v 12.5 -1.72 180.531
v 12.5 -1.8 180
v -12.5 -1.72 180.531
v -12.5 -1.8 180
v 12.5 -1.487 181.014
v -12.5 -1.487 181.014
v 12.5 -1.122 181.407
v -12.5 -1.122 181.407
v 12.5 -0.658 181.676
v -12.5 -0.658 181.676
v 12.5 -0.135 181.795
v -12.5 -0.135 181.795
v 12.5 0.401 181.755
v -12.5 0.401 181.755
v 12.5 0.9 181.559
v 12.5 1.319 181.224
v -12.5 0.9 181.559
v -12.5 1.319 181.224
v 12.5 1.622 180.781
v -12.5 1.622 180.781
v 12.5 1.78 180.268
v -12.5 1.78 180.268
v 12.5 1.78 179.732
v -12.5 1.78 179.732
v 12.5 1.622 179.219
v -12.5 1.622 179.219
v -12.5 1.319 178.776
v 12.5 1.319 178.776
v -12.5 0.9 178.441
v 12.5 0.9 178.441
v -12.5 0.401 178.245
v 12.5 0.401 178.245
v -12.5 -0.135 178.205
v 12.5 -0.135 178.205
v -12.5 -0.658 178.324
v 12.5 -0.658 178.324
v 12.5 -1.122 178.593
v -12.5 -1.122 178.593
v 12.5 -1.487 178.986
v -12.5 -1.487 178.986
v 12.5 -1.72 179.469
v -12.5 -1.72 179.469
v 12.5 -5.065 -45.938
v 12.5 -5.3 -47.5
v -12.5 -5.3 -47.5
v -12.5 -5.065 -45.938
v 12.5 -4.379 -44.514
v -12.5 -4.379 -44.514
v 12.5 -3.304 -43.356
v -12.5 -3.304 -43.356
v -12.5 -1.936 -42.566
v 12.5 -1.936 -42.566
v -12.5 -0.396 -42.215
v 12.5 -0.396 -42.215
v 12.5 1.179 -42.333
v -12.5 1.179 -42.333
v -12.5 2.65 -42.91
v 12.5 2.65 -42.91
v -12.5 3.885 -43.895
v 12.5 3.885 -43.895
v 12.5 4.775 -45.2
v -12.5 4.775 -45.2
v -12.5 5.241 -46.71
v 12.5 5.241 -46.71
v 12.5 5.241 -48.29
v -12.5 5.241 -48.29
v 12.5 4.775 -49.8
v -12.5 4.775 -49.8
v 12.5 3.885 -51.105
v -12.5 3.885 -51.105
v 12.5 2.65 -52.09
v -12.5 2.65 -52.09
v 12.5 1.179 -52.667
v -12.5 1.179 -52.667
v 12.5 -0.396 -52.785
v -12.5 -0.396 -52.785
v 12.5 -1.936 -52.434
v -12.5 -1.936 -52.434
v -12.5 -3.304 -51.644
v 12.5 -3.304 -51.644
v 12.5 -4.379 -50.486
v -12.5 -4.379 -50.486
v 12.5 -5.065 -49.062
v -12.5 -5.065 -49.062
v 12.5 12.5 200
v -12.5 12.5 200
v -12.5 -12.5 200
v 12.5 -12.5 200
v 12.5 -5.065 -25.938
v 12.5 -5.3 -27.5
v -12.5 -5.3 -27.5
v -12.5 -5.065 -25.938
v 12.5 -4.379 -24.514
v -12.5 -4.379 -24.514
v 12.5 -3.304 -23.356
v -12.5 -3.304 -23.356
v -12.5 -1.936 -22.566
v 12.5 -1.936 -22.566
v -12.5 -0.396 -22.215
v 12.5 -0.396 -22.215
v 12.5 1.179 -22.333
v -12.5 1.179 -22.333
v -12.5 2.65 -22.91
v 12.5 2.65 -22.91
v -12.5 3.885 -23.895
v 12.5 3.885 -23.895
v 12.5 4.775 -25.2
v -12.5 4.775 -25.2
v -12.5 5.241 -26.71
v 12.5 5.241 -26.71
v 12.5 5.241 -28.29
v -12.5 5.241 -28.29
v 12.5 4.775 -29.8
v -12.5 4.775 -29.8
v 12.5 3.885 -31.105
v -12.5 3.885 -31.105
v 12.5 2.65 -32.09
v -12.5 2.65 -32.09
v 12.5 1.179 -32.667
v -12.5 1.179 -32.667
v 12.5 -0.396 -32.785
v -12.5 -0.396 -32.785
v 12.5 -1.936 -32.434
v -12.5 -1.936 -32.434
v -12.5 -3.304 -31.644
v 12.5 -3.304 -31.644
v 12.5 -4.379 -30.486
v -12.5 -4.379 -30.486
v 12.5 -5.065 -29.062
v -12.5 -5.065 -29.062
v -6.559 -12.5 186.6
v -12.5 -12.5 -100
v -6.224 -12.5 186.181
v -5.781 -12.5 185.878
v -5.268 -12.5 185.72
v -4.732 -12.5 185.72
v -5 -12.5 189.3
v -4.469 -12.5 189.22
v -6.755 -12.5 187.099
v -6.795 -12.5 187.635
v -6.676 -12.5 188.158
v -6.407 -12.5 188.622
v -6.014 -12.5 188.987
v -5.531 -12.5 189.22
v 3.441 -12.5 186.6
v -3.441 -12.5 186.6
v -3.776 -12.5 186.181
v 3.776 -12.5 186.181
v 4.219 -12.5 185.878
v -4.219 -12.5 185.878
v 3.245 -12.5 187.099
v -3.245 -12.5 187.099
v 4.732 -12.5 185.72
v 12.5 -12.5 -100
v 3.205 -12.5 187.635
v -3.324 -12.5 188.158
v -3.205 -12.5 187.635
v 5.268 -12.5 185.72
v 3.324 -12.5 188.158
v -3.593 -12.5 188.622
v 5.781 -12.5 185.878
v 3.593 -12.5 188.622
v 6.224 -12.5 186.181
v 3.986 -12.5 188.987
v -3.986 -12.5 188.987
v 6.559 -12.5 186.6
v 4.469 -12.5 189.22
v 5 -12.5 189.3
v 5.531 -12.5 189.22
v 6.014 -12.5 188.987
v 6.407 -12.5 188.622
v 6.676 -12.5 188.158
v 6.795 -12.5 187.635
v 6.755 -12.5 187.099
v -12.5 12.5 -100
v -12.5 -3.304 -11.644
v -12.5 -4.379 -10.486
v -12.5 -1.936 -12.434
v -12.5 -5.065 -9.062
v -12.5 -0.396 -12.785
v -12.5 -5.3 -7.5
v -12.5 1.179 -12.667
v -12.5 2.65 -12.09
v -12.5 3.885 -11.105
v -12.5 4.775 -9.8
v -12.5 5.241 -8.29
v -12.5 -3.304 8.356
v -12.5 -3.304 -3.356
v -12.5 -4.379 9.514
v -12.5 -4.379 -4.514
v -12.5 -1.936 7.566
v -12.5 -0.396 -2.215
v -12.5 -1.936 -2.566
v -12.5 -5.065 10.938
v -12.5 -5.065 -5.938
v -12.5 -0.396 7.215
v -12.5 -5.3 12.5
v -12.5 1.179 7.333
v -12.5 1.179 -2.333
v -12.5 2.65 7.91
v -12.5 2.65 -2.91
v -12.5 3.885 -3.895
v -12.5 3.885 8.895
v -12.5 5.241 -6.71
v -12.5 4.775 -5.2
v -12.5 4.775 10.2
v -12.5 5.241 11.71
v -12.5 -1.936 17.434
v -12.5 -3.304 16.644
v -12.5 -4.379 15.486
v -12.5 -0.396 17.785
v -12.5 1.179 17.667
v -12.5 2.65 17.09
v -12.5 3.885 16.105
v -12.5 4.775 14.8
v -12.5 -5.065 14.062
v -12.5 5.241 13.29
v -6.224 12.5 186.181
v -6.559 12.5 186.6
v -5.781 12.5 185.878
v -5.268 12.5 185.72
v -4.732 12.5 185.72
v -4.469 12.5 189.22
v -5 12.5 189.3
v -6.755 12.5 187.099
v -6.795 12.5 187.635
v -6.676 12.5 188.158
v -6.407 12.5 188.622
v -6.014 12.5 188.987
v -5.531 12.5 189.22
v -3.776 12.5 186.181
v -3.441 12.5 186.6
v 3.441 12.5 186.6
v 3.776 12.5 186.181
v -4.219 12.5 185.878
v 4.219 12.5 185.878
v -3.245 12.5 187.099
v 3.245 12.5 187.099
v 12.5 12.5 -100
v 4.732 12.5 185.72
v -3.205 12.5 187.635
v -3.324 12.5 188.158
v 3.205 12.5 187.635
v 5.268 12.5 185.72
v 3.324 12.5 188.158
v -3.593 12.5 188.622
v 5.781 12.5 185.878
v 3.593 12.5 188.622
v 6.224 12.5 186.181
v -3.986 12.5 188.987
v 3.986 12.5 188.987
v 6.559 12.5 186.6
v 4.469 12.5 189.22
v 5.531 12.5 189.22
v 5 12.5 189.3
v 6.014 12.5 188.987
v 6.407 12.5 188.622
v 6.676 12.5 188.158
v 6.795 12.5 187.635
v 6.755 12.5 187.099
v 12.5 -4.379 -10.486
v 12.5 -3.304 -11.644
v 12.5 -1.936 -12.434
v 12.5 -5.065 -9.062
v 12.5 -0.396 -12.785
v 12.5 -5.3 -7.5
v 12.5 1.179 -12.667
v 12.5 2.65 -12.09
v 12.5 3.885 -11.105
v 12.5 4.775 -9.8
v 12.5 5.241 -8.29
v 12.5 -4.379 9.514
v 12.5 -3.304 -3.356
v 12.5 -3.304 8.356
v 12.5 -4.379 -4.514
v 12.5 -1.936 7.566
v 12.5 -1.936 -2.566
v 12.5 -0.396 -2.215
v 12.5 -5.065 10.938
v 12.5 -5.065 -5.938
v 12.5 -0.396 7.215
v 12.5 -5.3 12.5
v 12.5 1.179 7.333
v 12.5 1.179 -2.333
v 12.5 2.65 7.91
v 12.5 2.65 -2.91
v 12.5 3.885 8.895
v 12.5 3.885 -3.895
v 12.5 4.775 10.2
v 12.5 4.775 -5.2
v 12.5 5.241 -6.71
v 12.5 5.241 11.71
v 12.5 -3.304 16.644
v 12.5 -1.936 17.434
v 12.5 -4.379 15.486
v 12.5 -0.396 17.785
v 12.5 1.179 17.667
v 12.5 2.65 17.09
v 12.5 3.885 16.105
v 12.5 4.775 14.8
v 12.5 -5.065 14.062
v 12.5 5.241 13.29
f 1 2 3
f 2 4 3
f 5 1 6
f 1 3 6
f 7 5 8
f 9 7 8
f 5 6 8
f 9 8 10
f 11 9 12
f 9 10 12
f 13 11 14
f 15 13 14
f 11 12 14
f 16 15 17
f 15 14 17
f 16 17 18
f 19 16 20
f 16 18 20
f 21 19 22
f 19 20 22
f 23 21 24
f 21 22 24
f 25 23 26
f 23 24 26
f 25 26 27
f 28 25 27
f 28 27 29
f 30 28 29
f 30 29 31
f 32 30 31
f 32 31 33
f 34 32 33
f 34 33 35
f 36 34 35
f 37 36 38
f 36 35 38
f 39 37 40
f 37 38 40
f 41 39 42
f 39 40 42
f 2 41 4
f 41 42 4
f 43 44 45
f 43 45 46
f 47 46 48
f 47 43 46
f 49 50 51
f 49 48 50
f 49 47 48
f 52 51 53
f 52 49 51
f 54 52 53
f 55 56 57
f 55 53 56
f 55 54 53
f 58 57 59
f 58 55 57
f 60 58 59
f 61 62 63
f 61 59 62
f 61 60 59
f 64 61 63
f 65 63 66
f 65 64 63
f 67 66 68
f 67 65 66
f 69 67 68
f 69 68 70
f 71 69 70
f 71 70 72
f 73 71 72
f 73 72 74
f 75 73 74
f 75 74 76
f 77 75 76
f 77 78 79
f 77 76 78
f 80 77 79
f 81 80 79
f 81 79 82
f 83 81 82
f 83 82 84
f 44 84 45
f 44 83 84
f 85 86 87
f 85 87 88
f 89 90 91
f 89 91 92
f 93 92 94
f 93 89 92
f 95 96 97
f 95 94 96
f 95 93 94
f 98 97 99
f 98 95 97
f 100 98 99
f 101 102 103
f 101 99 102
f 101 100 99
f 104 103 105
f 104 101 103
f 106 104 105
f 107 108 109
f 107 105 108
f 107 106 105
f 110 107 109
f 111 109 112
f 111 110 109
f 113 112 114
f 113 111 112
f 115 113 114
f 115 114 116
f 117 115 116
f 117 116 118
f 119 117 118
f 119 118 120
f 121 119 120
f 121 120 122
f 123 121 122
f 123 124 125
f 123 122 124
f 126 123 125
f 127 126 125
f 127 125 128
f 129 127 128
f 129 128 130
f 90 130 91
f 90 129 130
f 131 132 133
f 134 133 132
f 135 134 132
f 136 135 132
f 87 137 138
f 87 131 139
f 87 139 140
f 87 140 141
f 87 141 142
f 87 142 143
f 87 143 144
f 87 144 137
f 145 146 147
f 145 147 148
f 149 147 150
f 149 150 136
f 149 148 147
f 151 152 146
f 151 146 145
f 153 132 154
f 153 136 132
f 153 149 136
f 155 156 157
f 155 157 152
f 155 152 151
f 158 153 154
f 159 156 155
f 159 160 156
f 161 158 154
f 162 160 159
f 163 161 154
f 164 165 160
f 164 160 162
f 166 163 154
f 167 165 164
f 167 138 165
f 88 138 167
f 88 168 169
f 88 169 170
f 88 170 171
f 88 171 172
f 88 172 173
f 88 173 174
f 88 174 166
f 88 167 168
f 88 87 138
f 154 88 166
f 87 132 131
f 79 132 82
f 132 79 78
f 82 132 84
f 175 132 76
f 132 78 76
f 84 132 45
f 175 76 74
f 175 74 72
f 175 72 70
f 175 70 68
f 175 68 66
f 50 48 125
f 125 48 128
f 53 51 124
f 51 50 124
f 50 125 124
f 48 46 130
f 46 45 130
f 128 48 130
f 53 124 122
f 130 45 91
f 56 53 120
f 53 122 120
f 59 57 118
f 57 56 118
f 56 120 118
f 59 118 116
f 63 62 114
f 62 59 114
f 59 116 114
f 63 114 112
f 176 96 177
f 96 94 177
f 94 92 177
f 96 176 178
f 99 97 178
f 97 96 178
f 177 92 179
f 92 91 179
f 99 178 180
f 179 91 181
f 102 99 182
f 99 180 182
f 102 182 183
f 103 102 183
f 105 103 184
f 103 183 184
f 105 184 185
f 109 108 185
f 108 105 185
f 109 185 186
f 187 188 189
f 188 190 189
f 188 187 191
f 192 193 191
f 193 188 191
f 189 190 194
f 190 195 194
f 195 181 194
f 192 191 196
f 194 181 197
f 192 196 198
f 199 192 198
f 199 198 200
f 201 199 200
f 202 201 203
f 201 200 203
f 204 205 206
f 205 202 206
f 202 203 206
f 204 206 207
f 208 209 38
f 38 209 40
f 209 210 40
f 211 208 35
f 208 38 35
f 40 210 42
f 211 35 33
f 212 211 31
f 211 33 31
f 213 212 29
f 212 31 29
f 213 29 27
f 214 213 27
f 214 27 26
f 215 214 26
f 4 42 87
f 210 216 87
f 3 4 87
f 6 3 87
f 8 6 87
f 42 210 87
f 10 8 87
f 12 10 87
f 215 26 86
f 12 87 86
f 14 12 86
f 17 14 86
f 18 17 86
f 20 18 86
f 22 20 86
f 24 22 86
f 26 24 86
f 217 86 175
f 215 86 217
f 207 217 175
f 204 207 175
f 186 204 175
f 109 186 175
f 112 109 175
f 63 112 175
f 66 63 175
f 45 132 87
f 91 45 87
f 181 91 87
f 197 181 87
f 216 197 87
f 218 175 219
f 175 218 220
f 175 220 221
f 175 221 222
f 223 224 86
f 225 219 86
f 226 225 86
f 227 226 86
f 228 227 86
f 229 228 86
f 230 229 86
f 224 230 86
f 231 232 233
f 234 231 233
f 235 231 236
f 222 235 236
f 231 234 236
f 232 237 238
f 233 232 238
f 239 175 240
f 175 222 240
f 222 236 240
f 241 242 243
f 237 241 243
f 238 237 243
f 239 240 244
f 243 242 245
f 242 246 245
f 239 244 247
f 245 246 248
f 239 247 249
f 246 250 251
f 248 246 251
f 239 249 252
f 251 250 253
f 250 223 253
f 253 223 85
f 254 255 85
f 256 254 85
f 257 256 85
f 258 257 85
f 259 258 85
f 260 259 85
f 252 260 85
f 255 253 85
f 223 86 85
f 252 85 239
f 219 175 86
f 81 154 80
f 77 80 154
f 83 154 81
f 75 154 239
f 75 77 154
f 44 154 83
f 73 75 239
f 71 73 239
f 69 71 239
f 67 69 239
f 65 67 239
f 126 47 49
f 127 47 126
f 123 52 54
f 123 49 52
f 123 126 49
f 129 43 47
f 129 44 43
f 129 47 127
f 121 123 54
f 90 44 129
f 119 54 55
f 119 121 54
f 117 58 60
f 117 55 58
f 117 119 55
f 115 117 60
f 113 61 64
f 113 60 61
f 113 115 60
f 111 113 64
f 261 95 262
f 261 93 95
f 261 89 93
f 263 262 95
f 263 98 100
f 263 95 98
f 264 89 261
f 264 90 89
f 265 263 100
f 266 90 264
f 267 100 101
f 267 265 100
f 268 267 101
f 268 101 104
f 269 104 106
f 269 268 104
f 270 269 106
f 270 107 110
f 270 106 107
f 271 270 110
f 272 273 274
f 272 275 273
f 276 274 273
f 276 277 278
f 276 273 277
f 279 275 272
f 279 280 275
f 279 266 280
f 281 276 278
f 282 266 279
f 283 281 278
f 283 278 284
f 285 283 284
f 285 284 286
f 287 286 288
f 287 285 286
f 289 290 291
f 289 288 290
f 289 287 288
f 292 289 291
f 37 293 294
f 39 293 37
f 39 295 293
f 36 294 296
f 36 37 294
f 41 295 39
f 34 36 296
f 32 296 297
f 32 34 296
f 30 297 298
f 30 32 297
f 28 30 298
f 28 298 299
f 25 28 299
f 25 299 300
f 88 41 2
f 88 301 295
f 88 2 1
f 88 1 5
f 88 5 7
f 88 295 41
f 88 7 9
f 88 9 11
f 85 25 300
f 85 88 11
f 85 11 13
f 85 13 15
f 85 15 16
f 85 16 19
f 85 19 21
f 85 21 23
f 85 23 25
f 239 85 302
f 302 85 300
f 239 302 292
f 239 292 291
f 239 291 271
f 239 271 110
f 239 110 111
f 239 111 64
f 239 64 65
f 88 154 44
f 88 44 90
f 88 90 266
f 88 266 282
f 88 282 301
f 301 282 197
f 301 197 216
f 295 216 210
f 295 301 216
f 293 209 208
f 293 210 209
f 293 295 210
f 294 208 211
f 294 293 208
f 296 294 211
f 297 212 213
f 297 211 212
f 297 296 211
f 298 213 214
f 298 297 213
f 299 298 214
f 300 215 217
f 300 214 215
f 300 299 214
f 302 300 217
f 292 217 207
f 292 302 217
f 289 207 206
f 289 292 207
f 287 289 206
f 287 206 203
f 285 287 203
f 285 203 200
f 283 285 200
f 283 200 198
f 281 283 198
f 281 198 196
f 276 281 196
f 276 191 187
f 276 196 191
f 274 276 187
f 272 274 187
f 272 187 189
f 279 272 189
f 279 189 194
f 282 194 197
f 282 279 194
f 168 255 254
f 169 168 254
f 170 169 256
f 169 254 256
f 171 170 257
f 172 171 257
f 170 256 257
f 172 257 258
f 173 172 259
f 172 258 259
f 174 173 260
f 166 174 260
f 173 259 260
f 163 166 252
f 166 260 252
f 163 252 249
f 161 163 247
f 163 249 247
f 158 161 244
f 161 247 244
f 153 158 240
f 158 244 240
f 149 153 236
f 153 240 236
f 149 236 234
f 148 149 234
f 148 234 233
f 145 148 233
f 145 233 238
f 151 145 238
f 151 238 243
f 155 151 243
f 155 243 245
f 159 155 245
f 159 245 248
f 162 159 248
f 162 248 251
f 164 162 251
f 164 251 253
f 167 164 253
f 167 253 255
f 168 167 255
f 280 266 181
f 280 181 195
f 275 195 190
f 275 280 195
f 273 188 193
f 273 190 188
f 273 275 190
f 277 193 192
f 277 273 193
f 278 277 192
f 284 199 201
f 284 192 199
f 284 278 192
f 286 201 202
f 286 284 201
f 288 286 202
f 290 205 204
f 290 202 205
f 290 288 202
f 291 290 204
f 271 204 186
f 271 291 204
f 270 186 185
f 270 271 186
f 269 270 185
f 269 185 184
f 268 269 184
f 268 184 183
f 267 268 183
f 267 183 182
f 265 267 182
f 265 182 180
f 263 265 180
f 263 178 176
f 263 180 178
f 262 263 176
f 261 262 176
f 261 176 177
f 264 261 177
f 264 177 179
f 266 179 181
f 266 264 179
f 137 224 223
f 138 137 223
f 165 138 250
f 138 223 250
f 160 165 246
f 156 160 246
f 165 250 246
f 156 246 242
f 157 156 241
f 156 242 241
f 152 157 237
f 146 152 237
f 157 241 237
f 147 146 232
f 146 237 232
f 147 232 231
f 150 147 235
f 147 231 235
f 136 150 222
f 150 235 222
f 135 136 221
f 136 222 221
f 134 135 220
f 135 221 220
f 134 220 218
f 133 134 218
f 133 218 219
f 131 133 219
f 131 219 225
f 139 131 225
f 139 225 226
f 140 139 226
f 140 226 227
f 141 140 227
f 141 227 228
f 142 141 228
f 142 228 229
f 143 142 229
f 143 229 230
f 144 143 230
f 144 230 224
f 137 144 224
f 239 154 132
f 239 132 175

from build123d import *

# Parameters (mm, degrees)
SKETCH1_W               = 25
SKETCH1_H               = 25
BOSS_EXTRUDE1_DEPTH     = 200
SKETCH2_R               = 2.5
CUT_EXTRUDE1_DEPTH      = 202.943680268
SKETCH3_R               = 1.8
CUT_EXTRUDE2_DEPTH      = 202.943680268
SKETCH4_R               = 1.8
CUT_EXTRUDE3_DEPTH      = 202.943680268
CUT_EXTRUDE5_DEPTH      = 202.943680268
CUT_EXTRUDE5_DEPTH_BACK = 202.943680268
SKETCH6_R               = 2.5
CUT_EXTRUDE6_DEPTH      = 202.943680268
CUT_EXTRUDE6_DEPTH_BACK = 202.943680268
SKETCH7_R               = 5.3
CUT_EXTRUDE7_DEPTH      = 202.943680268
CUT_EXTRUDE7_DEPTH_BACK = 202.943680268
SKETCH8_W               = 75
SKETCH8_H               = 25


with BuildPart() as part:
    # Sketch1 → Boss-Extrude1 (new body)
    with BuildSketch(Plane.XY):
        Rectangle(SKETCH1_W, SKETCH1_H)
    boss_extrude1 = extrude(amount=BOSS_EXTRUDE1_DEPTH)

    # Sketch2 → Cut-Extrude1 (cut, through all)
    with BuildSketch(Plane(origin=(12.5, 0, 0), x_dir=(0, 0, -1), z_dir=(1, 0, 0))):
        with Locations(Location((-12.5, 0, 0), (0, 0, 90))):
            Circle(SKETCH2_R)
    cut_extrude1 = extrude(amount=-CUT_EXTRUDE1_DEPTH, mode=Mode.SUBTRACT)

    # Sketch3 → Cut-Extrude2 (cut, through all)
    with BuildSketch(Plane(origin=(0, 12.5, 0), x_dir=(1, 0, 0), z_dir=(0, 1, 0))):
        with Locations(Location((-5, -187.5, 0), (0, 0, 270))):
            Circle(SKETCH3_R)
        with Locations(Location((5, -187.5, 0), (0, 0, 270))):
            Circle(SKETCH3_R)
    cut_extrude2 = extrude(amount=-CUT_EXTRUDE2_DEPTH, mode=Mode.SUBTRACT)

    # Sketch4 → Cut-Extrude3 (cut, symmetric)
    with BuildSketch(Plane.ZY.offset(12.5)):
        with Locations(Location((180, 0, 0), (0, 0, 270))):
            Circle(SKETCH4_R)
    cut_extrude3 = extrude(amount=CUT_EXTRUDE3_DEPTH, both=True, mode=Mode.SUBTRACT)

    # Mirror2: Boss-Extrude1, Cut-Extrude1, Cut-Extrude2, Cut-Extrude3 across plane
    add(boss_extrude1.mirror(Plane(origin=(0, 0, 12.5), x_dir=(1, 0, 0), z_dir=(0, 0, -1))))
    add(cut_extrude1.mirror(Plane(origin=(0, 0, 12.5), x_dir=(1, 0, 0), z_dir=(0, 0, -1))), mode=Mode.SUBTRACT)
    add(cut_extrude2.mirror(Plane(origin=(0, 0, 12.5), x_dir=(1, 0, 0), z_dir=(0, 0, -1))), mode=Mode.SUBTRACT)
    add(cut_extrude3.mirror(Plane(origin=(0, 0, 12.5), x_dir=(1, 0, 0), z_dir=(0, 0, -1))), mode=Mode.SUBTRACT)

    # Sketch6 → Cut-Extrude5 (cut, two sides: drawn at the far end of the back side and taken through both)
    with BuildSketch(Plane(origin=(12.5, 0, 0), x_dir=(0, 0, -1), z_dir=(1, 0, 0)).offset(-CUT_EXTRUDE5_DEPTH_BACK)):
        with Locations(Location((7.5, 0, 0), (0, 0, 90))):
            Circle(SKETCH6_R)
        with Locations(Location((-12.5, 0, 0), (0, 0, 90))):
            Circle(SKETCH6_R)
        with Locations(Location((27.5, 0, 0), (0, 0, 90))):
            Circle(SKETCH6_R)
        with Locations(Location((47.5, 0, 0), (0, 0, 90))):
            Circle(SKETCH6_R)
    extrude(amount=CUT_EXTRUDE5_DEPTH + CUT_EXTRUDE5_DEPTH_BACK, mode=Mode.SUBTRACT)

    # Sketch7 → Cut-Extrude6 (cut, two sides: drawn at the far end of the back side and taken through both)
    with BuildSketch(Plane.ZY.offset(12.5).offset(-CUT_EXTRUDE6_DEPTH_BACK)):
        with Locations(Location((-47.5, 0, 0), (0, 0, 270))):
            Circle(SKETCH7_R)
        with Locations(Location((-27.5, 0, 0), (0, 0, 270))):
            Circle(SKETCH7_R)
        with Locations(Location((-7.5, 0, 0), (0, 0, 270))):
            Circle(SKETCH7_R)
        with Locations(Location((12.5, 0, 0), (0, 0, 270))):
            Circle(SKETCH7_R)
    extrude(amount=CUT_EXTRUDE6_DEPTH + CUT_EXTRUDE6_DEPTH_BACK, mode=Mode.SUBTRACT)

    # Sketch8 → Cut-Extrude7 (cut, two sides: drawn at the far end of the back side and taken through both)
    with BuildSketch(Plane.ZY.offset(12.5).offset(-CUT_EXTRUDE7_DEPTH_BACK)):
        with Locations((-137.5, 0)):
            Rectangle(SKETCH8_W, SKETCH8_H)
    extrude(amount=CUT_EXTRUDE7_DEPTH + CUT_EXTRUDE7_DEPTH_BACK, mode=Mode.SUBTRACT)


solid = part.part
